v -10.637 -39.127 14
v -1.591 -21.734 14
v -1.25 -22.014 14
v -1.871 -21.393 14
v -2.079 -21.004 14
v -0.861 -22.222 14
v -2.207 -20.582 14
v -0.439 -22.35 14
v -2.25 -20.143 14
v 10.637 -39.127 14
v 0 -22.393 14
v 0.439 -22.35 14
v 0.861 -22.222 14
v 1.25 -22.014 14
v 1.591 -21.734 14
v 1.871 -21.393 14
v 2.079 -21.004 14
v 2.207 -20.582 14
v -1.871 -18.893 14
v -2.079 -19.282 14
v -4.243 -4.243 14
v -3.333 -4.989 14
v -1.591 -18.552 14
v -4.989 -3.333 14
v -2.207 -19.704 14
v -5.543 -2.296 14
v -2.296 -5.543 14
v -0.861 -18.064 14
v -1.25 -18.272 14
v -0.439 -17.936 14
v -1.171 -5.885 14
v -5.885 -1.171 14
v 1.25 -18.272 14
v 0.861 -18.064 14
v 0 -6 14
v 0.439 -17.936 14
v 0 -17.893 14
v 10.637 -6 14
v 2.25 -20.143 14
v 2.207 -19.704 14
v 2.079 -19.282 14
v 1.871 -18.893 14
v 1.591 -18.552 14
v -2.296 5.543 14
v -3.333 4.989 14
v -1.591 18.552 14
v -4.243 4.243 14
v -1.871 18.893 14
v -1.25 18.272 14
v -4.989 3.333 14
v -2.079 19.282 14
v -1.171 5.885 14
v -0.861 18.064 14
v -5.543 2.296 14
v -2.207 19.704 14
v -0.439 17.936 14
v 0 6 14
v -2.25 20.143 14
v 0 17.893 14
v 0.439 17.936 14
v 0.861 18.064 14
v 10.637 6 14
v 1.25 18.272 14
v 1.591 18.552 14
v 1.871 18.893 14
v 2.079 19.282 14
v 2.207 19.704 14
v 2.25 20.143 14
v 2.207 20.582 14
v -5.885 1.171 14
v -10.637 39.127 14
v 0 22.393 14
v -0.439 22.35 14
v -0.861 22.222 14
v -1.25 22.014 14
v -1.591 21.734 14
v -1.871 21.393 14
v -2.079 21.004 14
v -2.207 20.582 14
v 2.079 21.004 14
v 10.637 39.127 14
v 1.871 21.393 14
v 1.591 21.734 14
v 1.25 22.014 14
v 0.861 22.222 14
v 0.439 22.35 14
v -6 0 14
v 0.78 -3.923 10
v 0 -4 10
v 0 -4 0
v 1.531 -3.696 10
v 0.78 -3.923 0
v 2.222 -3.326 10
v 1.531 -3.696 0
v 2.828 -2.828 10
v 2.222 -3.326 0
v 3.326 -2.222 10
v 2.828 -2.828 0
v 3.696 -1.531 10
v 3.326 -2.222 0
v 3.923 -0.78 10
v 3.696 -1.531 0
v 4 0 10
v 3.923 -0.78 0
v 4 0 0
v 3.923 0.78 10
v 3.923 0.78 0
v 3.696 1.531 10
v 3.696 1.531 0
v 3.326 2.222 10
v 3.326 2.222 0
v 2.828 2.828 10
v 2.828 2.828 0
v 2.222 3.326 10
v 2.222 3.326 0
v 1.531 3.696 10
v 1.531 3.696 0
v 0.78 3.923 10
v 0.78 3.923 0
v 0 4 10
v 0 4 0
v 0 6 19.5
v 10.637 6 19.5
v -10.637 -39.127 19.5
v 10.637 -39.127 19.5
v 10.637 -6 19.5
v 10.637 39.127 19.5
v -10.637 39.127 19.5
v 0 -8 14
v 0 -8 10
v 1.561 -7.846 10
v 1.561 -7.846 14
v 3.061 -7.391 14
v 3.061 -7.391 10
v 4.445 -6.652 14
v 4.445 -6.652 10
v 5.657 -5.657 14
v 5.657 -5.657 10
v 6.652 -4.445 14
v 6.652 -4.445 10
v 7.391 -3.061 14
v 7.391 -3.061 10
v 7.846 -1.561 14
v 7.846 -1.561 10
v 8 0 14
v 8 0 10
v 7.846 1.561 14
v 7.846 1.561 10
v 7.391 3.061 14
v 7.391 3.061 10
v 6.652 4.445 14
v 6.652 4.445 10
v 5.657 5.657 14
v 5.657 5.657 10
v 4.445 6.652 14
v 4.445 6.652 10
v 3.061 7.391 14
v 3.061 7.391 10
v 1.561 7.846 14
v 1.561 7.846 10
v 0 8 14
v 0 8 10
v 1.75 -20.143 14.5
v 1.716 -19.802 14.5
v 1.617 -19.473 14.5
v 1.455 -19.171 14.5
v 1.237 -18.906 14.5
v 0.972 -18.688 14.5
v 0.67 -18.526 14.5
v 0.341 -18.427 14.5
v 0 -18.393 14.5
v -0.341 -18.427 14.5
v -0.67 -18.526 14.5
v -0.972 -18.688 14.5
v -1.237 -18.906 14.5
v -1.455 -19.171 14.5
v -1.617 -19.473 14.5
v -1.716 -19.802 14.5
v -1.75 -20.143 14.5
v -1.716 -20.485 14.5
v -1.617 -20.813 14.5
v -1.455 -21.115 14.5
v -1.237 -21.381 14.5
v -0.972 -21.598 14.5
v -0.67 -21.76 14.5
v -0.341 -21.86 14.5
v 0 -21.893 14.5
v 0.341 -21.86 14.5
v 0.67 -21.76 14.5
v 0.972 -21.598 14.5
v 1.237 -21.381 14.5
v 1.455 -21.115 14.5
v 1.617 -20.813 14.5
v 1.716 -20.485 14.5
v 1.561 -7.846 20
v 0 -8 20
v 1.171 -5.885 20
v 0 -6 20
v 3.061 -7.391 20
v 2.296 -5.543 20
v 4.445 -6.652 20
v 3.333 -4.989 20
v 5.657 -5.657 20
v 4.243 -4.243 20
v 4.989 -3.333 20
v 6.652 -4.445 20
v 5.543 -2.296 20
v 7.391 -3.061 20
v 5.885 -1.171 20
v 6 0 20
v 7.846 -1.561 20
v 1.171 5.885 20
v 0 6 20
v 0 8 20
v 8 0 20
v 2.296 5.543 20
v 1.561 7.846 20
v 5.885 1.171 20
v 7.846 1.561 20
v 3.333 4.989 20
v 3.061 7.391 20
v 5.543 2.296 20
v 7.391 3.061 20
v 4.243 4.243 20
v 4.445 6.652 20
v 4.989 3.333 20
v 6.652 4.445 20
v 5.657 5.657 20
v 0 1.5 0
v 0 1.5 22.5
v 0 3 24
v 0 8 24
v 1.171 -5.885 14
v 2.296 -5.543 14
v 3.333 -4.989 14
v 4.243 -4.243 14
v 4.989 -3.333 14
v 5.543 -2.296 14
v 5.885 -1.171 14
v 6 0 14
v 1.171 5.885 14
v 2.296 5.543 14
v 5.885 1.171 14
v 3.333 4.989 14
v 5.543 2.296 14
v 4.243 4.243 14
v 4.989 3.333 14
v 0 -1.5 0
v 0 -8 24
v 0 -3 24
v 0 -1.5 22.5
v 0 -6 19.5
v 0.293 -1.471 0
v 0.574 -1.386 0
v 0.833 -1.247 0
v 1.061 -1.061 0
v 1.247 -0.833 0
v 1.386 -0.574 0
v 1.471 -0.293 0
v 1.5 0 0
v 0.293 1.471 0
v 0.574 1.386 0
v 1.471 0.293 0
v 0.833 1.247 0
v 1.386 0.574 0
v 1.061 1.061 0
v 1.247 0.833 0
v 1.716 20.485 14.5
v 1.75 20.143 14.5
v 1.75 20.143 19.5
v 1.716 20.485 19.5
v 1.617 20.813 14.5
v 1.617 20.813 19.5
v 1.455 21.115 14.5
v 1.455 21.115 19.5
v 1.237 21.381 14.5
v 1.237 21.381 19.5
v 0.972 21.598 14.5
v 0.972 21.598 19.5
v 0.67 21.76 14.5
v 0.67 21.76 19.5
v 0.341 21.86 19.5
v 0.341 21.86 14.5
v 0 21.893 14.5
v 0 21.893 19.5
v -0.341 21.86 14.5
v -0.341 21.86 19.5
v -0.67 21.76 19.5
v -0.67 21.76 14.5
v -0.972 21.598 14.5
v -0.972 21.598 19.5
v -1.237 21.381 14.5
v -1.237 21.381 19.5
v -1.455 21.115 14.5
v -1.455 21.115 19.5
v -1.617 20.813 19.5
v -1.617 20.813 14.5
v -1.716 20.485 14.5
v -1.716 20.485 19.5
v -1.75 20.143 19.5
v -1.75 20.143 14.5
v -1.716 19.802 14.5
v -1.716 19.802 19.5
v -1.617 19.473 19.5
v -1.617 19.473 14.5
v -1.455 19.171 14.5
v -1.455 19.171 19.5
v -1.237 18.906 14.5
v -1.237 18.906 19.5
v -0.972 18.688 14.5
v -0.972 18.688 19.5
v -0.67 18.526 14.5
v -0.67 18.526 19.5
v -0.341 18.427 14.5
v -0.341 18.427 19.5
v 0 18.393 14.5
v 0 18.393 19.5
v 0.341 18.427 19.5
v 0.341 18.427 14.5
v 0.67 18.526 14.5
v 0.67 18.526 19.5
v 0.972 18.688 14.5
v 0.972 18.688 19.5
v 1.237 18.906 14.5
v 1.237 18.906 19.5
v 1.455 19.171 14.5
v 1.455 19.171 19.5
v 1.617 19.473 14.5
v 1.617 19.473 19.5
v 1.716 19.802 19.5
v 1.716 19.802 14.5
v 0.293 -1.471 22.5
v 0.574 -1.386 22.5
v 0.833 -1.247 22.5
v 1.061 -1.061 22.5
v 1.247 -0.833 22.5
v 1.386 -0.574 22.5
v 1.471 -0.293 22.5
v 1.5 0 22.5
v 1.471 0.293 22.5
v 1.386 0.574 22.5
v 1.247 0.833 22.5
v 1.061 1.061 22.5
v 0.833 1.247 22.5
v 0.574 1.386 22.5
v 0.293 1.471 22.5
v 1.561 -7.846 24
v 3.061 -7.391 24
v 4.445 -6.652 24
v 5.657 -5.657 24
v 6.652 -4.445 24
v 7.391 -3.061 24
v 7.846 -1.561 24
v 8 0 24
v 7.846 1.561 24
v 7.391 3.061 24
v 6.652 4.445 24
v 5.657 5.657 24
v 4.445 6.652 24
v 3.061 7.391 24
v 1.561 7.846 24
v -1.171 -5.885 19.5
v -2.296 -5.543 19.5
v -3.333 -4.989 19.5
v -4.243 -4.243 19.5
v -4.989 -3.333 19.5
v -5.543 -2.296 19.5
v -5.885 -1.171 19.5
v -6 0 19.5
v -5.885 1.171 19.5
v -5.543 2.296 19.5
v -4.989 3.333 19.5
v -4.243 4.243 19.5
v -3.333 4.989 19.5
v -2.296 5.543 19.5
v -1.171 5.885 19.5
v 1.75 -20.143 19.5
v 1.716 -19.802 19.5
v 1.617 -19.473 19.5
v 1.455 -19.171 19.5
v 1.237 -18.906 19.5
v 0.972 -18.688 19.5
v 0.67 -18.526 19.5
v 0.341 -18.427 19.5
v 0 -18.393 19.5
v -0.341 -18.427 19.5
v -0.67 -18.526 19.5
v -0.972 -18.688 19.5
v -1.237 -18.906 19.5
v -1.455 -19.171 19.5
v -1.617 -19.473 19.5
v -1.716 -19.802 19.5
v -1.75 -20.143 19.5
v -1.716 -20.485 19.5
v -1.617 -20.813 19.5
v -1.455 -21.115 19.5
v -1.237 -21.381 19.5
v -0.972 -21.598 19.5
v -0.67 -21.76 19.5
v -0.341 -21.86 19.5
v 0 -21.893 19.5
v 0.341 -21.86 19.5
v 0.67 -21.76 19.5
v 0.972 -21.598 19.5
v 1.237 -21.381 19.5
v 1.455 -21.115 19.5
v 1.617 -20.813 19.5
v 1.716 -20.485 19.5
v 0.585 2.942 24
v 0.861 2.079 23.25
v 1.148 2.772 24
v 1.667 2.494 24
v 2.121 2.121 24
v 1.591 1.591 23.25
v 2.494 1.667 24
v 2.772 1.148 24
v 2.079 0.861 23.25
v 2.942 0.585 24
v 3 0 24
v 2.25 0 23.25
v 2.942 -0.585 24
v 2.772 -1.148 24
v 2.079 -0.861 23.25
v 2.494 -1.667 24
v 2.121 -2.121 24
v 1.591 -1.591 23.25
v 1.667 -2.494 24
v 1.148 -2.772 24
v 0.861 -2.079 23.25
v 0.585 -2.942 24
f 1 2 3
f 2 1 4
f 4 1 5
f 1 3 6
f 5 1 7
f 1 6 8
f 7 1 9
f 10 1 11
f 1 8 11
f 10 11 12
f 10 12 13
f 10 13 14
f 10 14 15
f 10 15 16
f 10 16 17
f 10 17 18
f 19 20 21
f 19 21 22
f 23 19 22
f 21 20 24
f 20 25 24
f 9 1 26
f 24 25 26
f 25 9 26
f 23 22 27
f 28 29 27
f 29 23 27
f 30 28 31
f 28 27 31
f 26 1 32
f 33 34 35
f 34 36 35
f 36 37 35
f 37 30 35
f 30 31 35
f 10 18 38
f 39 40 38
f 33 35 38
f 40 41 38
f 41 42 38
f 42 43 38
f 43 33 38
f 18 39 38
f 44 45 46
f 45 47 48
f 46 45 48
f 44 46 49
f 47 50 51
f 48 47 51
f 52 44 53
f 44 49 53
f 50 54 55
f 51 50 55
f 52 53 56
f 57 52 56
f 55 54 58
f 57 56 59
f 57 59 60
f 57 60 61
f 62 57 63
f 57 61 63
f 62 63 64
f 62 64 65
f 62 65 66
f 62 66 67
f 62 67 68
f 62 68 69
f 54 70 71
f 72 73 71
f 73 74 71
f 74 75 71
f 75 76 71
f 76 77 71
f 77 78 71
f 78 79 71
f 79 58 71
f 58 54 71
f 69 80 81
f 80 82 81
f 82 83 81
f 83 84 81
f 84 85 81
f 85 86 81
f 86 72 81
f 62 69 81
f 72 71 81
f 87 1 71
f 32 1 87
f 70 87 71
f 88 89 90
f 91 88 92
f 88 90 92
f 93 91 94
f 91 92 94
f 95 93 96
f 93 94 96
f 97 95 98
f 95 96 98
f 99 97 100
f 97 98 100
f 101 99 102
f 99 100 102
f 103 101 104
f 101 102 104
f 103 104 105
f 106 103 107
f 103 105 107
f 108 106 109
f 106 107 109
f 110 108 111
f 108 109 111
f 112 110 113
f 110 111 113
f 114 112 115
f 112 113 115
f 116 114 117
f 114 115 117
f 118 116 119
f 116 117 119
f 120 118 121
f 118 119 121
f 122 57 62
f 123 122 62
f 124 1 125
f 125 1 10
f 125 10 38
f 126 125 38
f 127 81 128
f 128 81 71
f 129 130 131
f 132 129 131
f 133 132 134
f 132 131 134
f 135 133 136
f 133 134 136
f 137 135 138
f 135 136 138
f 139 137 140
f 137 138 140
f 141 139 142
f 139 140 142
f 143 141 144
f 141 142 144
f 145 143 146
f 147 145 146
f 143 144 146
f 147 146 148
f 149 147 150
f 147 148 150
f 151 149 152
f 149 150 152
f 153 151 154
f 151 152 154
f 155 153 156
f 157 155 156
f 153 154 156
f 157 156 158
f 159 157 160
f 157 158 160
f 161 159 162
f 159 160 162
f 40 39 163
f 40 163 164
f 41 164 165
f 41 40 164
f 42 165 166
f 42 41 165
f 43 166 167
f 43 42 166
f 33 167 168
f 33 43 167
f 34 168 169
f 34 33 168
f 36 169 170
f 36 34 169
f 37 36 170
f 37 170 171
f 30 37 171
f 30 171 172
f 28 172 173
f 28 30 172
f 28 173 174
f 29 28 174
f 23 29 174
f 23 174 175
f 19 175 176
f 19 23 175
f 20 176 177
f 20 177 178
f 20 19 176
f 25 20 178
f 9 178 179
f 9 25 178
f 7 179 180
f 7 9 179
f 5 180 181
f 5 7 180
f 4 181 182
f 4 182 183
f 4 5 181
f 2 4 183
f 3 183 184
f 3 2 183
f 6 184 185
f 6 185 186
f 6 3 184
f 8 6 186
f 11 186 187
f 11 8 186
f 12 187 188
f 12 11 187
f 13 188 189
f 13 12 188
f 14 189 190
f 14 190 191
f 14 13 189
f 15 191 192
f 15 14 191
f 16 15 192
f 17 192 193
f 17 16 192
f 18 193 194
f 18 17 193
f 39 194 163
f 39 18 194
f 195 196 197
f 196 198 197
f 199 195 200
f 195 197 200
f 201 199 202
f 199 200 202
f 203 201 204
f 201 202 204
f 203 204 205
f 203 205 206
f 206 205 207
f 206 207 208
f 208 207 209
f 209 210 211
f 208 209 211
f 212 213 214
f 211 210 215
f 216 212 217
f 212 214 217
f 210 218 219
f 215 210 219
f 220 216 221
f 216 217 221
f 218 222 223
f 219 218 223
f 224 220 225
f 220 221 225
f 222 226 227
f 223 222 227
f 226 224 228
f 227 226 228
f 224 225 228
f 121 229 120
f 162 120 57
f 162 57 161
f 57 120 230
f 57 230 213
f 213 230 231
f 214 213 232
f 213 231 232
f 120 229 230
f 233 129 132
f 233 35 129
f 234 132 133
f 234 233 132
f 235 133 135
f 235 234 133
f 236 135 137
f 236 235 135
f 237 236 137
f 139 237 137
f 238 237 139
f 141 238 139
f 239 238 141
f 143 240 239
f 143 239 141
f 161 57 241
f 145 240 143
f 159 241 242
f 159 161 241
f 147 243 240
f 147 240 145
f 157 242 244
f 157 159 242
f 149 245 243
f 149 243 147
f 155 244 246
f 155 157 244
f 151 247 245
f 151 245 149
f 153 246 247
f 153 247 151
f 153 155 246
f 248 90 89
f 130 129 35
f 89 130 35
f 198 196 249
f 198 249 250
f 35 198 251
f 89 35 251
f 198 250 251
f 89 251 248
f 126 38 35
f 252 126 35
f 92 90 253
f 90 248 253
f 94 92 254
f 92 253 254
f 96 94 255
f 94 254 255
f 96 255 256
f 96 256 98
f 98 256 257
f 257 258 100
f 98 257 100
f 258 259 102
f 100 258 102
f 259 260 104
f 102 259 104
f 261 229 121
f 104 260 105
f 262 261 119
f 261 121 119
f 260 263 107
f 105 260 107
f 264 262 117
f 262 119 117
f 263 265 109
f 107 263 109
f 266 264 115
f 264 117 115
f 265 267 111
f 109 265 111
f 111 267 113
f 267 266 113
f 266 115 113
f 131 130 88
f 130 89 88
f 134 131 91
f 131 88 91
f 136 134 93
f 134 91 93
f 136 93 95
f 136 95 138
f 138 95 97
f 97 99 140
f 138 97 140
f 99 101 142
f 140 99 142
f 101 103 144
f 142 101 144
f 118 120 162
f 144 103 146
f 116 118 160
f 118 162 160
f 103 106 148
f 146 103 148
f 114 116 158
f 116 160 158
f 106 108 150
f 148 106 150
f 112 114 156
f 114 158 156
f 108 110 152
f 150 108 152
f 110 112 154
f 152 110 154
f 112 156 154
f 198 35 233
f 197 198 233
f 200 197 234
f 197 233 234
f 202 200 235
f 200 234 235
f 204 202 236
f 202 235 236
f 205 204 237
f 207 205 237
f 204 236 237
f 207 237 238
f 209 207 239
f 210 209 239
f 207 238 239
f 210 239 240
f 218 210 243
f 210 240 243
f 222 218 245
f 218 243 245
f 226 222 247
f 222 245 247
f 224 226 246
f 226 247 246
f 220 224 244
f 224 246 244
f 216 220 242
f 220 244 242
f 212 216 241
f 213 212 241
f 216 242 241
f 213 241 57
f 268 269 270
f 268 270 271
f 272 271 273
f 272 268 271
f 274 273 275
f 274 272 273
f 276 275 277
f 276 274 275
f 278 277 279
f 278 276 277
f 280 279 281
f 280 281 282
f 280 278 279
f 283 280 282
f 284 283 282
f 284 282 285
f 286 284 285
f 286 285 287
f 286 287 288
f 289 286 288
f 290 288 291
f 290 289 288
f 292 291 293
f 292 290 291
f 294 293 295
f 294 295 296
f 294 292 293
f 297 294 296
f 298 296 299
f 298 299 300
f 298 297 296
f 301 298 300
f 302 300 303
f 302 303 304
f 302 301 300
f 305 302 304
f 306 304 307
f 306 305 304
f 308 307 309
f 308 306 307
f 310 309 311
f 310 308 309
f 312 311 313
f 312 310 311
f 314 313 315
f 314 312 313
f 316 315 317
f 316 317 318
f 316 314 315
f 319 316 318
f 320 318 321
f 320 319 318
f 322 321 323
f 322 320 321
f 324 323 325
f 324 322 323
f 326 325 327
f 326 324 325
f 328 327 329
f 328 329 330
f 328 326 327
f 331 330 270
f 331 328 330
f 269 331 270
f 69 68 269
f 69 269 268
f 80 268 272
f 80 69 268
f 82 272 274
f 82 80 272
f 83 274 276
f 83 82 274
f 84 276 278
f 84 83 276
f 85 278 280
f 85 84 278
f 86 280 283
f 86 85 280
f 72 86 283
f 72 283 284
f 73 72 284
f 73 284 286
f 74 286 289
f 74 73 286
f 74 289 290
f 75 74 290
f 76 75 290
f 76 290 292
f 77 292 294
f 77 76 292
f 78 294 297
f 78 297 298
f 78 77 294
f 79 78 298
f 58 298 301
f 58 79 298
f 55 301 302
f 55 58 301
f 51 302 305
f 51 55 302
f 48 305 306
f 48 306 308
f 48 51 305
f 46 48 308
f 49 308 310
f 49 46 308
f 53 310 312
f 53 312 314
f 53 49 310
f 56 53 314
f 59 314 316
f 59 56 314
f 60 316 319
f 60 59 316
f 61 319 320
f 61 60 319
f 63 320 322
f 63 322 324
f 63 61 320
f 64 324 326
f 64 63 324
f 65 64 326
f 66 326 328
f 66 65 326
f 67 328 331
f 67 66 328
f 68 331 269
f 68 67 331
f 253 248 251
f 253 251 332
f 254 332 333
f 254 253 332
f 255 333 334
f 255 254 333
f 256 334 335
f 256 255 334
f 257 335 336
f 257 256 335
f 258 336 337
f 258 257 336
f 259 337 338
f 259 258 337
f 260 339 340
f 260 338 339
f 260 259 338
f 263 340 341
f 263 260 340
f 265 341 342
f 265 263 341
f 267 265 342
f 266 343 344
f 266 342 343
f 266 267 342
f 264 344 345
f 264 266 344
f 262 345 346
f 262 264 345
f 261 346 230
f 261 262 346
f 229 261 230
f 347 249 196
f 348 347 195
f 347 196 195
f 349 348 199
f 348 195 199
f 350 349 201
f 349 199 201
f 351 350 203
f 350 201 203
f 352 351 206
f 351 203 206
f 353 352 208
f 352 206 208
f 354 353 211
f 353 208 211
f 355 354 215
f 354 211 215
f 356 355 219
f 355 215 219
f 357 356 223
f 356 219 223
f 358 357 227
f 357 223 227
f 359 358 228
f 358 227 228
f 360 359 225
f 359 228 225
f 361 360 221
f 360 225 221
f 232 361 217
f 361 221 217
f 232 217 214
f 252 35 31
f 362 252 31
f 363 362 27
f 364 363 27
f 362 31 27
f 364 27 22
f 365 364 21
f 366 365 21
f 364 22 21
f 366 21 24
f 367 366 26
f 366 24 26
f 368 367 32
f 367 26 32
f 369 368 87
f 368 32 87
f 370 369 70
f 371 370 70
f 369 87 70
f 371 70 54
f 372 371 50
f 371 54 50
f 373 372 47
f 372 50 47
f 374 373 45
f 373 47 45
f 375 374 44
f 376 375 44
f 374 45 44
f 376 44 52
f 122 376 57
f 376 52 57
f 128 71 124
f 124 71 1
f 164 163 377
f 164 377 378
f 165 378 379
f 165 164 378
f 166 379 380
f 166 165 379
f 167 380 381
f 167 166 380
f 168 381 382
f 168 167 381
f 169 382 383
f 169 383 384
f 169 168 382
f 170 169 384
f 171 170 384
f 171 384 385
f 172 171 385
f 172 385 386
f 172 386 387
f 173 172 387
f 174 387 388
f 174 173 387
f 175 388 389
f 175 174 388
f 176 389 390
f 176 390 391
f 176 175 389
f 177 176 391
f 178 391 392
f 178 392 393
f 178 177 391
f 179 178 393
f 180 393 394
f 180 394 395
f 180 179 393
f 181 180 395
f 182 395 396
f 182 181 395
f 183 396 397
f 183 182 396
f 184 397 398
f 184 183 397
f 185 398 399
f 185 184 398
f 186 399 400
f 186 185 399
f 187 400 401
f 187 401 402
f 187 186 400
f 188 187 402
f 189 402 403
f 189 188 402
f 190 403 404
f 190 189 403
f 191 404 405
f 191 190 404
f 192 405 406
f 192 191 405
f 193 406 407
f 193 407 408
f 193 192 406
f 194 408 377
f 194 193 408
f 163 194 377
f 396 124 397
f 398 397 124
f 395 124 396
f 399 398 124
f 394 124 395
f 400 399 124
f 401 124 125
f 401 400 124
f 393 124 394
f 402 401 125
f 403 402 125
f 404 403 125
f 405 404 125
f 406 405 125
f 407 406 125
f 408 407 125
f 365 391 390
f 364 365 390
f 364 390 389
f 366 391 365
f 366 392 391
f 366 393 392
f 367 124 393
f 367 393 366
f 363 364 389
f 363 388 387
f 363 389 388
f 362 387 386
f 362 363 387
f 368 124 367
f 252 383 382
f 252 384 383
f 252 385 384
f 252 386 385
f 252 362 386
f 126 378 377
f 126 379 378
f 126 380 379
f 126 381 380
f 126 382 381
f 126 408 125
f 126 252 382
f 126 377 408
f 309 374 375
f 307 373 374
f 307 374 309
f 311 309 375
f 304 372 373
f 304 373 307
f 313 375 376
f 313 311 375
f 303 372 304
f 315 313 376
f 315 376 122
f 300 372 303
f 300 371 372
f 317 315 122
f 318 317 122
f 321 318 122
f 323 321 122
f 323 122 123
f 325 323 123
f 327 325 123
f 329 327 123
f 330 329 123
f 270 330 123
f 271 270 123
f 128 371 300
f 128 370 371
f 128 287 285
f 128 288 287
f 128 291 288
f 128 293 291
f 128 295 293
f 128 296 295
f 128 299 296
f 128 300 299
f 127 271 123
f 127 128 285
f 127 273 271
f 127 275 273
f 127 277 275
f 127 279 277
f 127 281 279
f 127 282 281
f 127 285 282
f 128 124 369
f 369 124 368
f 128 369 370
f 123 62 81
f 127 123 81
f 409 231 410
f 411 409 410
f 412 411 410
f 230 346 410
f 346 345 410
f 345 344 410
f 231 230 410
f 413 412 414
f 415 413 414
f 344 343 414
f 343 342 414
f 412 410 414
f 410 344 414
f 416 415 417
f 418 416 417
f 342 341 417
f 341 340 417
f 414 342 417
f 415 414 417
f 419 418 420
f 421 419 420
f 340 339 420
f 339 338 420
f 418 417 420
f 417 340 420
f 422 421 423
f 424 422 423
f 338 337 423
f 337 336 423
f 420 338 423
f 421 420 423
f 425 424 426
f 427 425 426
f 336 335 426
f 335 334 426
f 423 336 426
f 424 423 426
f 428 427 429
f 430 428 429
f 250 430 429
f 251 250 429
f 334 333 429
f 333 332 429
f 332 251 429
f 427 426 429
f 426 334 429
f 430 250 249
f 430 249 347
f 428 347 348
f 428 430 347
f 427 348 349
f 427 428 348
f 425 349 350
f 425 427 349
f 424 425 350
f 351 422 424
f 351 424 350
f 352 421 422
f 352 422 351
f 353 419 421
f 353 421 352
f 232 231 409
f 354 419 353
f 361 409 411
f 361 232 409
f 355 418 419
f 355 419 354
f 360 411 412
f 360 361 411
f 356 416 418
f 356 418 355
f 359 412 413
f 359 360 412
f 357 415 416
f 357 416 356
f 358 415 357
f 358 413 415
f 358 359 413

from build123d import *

# Parameters (mm, degrees)
F0_R      = 4
F0_R_2    = 1.5
F1_DEPTH  = 10
F2_R      = 8
F3_DEPTH  = 4
F4_R      = 6
F5_DEPTH  = 6
F6_R      = 8
F7_DEPTH  = 4
F8_DEPTH  = 24.001
F9_SIZE   = 1.5
F10_R     = 1.75
F11_DEPTH = 5.5
F12_SIZE  = 0.5
F13_W     = 9.0406714007
F13_H     = 17.2127164826
F14_DEPTH = 24


with BuildPart() as f1:
    # F0 (on Top) → F1 (new body)
    with BuildSketch(Plane.XY):
        Circle(F0_R)
        Circle(F0_R_2, mode=Mode.SUBTRACT)
        Circle(F0_R_2)
    extrude(amount=F1_DEPTH)

    # F2 (on face) → F3 (join)
    with BuildSketch(Plane.XY.offset(10)):
        Circle(F2_R)
    extrude(amount=F3_DEPTH)

    # F4 (on face) → F5 (join)
    with BuildSketch(Plane.XY.offset(14)):
        Circle(F4_R)
    extrude(amount=F5_DEPTH)

    # F6 (on face) → F7 (join)
    with BuildSketch(Plane.XY.offset(20)):
        Circle(F6_R)
    extrude(amount=F7_DEPTH)

    # F0 (on Top) → F8 (cut, through all)
    with BuildSketch(Plane.XY):
        Circle(F0_R_2)
    extrude(amount=F8_DEPTH, mode=Mode.SUBTRACT)

    # F9
    f9_edges = [f1.edges().sort_by_distance(p)[0] for p in [
        (-1.5, 0, 24),
    ]]
    chamfer(f9_edges, length=F9_SIZE)


with BuildPart() as f11:
    # F10 (on face) → F11 (new body)
    with BuildSketch(Plane.XY.offset(14)):
        with BuildLine():
            Line((-10.6372348964, 39.1267947853), (-10.6372348964, -39.1267947853))
            Line((-10.6372348964, -39.1267947853), (10.6372348964, -39.1267947853))
            Line((10.6372348964, -39.1267947853), (10.6372348964, -6))
            Line((10.6372348964, -6), (5.2915026221, -6))
            ThreePointArc((5.2915026221, -6), (-8, 0), (5.2915026221, 6))
            Line((5.2915026221, 6), (10.6372348964, 6))
            Line((10.6372348964, 6), (10.6372348964, 39.1267947853))
            Line((10.6372348964, 39.1267947853), (-10.6372348964, 39.1267947853))
        make_face()
        with Locations((0, -20.1431717724)):
            Circle(F10_R, mode=Mode.SUBTRACT)
        with Locations((0, 20.1431717724)):
            Circle(F10_R, mode=Mode.SUBTRACT)
        with BuildLine():
            ThreePointArc((5.2915026221, 6), (-8, 0), (5.2915026221, -6))
            Line((5.2915026221, -6), (0, -6))
            ThreePointArc((0, -6), (-6, 0), (0, 6))
            Line((0, 6), (5.2915026221, 6))
        make_face()
    extrude(amount=F11_DEPTH)

    # F12
    f12_edges = [f11.edges().sort_by_distance(p)[0] for p in [
        (-1.75, 20.143172, 14),
        (-1.75, -20.143172, 14),
    ]]
    chamfer(f12_edges, length=F12_SIZE)


with BuildPart() as f14:
    # F13 (on face) → F14 (new body, through all)
    with BuildSketch(Plane.XY.offset(24)):
        with Locations((-4.5203357004, -0.6063582413)):
            Rectangle(F13_W, F13_H)
    extrude(amount=-F14_DEPTH)


with BuildPart() as f1_1:
    add(f1.part)

    # F15: cut F14
    add(f14.part, mode=Mode.SUBTRACT)


solid = Compound([f11.part, f1_1.part])
